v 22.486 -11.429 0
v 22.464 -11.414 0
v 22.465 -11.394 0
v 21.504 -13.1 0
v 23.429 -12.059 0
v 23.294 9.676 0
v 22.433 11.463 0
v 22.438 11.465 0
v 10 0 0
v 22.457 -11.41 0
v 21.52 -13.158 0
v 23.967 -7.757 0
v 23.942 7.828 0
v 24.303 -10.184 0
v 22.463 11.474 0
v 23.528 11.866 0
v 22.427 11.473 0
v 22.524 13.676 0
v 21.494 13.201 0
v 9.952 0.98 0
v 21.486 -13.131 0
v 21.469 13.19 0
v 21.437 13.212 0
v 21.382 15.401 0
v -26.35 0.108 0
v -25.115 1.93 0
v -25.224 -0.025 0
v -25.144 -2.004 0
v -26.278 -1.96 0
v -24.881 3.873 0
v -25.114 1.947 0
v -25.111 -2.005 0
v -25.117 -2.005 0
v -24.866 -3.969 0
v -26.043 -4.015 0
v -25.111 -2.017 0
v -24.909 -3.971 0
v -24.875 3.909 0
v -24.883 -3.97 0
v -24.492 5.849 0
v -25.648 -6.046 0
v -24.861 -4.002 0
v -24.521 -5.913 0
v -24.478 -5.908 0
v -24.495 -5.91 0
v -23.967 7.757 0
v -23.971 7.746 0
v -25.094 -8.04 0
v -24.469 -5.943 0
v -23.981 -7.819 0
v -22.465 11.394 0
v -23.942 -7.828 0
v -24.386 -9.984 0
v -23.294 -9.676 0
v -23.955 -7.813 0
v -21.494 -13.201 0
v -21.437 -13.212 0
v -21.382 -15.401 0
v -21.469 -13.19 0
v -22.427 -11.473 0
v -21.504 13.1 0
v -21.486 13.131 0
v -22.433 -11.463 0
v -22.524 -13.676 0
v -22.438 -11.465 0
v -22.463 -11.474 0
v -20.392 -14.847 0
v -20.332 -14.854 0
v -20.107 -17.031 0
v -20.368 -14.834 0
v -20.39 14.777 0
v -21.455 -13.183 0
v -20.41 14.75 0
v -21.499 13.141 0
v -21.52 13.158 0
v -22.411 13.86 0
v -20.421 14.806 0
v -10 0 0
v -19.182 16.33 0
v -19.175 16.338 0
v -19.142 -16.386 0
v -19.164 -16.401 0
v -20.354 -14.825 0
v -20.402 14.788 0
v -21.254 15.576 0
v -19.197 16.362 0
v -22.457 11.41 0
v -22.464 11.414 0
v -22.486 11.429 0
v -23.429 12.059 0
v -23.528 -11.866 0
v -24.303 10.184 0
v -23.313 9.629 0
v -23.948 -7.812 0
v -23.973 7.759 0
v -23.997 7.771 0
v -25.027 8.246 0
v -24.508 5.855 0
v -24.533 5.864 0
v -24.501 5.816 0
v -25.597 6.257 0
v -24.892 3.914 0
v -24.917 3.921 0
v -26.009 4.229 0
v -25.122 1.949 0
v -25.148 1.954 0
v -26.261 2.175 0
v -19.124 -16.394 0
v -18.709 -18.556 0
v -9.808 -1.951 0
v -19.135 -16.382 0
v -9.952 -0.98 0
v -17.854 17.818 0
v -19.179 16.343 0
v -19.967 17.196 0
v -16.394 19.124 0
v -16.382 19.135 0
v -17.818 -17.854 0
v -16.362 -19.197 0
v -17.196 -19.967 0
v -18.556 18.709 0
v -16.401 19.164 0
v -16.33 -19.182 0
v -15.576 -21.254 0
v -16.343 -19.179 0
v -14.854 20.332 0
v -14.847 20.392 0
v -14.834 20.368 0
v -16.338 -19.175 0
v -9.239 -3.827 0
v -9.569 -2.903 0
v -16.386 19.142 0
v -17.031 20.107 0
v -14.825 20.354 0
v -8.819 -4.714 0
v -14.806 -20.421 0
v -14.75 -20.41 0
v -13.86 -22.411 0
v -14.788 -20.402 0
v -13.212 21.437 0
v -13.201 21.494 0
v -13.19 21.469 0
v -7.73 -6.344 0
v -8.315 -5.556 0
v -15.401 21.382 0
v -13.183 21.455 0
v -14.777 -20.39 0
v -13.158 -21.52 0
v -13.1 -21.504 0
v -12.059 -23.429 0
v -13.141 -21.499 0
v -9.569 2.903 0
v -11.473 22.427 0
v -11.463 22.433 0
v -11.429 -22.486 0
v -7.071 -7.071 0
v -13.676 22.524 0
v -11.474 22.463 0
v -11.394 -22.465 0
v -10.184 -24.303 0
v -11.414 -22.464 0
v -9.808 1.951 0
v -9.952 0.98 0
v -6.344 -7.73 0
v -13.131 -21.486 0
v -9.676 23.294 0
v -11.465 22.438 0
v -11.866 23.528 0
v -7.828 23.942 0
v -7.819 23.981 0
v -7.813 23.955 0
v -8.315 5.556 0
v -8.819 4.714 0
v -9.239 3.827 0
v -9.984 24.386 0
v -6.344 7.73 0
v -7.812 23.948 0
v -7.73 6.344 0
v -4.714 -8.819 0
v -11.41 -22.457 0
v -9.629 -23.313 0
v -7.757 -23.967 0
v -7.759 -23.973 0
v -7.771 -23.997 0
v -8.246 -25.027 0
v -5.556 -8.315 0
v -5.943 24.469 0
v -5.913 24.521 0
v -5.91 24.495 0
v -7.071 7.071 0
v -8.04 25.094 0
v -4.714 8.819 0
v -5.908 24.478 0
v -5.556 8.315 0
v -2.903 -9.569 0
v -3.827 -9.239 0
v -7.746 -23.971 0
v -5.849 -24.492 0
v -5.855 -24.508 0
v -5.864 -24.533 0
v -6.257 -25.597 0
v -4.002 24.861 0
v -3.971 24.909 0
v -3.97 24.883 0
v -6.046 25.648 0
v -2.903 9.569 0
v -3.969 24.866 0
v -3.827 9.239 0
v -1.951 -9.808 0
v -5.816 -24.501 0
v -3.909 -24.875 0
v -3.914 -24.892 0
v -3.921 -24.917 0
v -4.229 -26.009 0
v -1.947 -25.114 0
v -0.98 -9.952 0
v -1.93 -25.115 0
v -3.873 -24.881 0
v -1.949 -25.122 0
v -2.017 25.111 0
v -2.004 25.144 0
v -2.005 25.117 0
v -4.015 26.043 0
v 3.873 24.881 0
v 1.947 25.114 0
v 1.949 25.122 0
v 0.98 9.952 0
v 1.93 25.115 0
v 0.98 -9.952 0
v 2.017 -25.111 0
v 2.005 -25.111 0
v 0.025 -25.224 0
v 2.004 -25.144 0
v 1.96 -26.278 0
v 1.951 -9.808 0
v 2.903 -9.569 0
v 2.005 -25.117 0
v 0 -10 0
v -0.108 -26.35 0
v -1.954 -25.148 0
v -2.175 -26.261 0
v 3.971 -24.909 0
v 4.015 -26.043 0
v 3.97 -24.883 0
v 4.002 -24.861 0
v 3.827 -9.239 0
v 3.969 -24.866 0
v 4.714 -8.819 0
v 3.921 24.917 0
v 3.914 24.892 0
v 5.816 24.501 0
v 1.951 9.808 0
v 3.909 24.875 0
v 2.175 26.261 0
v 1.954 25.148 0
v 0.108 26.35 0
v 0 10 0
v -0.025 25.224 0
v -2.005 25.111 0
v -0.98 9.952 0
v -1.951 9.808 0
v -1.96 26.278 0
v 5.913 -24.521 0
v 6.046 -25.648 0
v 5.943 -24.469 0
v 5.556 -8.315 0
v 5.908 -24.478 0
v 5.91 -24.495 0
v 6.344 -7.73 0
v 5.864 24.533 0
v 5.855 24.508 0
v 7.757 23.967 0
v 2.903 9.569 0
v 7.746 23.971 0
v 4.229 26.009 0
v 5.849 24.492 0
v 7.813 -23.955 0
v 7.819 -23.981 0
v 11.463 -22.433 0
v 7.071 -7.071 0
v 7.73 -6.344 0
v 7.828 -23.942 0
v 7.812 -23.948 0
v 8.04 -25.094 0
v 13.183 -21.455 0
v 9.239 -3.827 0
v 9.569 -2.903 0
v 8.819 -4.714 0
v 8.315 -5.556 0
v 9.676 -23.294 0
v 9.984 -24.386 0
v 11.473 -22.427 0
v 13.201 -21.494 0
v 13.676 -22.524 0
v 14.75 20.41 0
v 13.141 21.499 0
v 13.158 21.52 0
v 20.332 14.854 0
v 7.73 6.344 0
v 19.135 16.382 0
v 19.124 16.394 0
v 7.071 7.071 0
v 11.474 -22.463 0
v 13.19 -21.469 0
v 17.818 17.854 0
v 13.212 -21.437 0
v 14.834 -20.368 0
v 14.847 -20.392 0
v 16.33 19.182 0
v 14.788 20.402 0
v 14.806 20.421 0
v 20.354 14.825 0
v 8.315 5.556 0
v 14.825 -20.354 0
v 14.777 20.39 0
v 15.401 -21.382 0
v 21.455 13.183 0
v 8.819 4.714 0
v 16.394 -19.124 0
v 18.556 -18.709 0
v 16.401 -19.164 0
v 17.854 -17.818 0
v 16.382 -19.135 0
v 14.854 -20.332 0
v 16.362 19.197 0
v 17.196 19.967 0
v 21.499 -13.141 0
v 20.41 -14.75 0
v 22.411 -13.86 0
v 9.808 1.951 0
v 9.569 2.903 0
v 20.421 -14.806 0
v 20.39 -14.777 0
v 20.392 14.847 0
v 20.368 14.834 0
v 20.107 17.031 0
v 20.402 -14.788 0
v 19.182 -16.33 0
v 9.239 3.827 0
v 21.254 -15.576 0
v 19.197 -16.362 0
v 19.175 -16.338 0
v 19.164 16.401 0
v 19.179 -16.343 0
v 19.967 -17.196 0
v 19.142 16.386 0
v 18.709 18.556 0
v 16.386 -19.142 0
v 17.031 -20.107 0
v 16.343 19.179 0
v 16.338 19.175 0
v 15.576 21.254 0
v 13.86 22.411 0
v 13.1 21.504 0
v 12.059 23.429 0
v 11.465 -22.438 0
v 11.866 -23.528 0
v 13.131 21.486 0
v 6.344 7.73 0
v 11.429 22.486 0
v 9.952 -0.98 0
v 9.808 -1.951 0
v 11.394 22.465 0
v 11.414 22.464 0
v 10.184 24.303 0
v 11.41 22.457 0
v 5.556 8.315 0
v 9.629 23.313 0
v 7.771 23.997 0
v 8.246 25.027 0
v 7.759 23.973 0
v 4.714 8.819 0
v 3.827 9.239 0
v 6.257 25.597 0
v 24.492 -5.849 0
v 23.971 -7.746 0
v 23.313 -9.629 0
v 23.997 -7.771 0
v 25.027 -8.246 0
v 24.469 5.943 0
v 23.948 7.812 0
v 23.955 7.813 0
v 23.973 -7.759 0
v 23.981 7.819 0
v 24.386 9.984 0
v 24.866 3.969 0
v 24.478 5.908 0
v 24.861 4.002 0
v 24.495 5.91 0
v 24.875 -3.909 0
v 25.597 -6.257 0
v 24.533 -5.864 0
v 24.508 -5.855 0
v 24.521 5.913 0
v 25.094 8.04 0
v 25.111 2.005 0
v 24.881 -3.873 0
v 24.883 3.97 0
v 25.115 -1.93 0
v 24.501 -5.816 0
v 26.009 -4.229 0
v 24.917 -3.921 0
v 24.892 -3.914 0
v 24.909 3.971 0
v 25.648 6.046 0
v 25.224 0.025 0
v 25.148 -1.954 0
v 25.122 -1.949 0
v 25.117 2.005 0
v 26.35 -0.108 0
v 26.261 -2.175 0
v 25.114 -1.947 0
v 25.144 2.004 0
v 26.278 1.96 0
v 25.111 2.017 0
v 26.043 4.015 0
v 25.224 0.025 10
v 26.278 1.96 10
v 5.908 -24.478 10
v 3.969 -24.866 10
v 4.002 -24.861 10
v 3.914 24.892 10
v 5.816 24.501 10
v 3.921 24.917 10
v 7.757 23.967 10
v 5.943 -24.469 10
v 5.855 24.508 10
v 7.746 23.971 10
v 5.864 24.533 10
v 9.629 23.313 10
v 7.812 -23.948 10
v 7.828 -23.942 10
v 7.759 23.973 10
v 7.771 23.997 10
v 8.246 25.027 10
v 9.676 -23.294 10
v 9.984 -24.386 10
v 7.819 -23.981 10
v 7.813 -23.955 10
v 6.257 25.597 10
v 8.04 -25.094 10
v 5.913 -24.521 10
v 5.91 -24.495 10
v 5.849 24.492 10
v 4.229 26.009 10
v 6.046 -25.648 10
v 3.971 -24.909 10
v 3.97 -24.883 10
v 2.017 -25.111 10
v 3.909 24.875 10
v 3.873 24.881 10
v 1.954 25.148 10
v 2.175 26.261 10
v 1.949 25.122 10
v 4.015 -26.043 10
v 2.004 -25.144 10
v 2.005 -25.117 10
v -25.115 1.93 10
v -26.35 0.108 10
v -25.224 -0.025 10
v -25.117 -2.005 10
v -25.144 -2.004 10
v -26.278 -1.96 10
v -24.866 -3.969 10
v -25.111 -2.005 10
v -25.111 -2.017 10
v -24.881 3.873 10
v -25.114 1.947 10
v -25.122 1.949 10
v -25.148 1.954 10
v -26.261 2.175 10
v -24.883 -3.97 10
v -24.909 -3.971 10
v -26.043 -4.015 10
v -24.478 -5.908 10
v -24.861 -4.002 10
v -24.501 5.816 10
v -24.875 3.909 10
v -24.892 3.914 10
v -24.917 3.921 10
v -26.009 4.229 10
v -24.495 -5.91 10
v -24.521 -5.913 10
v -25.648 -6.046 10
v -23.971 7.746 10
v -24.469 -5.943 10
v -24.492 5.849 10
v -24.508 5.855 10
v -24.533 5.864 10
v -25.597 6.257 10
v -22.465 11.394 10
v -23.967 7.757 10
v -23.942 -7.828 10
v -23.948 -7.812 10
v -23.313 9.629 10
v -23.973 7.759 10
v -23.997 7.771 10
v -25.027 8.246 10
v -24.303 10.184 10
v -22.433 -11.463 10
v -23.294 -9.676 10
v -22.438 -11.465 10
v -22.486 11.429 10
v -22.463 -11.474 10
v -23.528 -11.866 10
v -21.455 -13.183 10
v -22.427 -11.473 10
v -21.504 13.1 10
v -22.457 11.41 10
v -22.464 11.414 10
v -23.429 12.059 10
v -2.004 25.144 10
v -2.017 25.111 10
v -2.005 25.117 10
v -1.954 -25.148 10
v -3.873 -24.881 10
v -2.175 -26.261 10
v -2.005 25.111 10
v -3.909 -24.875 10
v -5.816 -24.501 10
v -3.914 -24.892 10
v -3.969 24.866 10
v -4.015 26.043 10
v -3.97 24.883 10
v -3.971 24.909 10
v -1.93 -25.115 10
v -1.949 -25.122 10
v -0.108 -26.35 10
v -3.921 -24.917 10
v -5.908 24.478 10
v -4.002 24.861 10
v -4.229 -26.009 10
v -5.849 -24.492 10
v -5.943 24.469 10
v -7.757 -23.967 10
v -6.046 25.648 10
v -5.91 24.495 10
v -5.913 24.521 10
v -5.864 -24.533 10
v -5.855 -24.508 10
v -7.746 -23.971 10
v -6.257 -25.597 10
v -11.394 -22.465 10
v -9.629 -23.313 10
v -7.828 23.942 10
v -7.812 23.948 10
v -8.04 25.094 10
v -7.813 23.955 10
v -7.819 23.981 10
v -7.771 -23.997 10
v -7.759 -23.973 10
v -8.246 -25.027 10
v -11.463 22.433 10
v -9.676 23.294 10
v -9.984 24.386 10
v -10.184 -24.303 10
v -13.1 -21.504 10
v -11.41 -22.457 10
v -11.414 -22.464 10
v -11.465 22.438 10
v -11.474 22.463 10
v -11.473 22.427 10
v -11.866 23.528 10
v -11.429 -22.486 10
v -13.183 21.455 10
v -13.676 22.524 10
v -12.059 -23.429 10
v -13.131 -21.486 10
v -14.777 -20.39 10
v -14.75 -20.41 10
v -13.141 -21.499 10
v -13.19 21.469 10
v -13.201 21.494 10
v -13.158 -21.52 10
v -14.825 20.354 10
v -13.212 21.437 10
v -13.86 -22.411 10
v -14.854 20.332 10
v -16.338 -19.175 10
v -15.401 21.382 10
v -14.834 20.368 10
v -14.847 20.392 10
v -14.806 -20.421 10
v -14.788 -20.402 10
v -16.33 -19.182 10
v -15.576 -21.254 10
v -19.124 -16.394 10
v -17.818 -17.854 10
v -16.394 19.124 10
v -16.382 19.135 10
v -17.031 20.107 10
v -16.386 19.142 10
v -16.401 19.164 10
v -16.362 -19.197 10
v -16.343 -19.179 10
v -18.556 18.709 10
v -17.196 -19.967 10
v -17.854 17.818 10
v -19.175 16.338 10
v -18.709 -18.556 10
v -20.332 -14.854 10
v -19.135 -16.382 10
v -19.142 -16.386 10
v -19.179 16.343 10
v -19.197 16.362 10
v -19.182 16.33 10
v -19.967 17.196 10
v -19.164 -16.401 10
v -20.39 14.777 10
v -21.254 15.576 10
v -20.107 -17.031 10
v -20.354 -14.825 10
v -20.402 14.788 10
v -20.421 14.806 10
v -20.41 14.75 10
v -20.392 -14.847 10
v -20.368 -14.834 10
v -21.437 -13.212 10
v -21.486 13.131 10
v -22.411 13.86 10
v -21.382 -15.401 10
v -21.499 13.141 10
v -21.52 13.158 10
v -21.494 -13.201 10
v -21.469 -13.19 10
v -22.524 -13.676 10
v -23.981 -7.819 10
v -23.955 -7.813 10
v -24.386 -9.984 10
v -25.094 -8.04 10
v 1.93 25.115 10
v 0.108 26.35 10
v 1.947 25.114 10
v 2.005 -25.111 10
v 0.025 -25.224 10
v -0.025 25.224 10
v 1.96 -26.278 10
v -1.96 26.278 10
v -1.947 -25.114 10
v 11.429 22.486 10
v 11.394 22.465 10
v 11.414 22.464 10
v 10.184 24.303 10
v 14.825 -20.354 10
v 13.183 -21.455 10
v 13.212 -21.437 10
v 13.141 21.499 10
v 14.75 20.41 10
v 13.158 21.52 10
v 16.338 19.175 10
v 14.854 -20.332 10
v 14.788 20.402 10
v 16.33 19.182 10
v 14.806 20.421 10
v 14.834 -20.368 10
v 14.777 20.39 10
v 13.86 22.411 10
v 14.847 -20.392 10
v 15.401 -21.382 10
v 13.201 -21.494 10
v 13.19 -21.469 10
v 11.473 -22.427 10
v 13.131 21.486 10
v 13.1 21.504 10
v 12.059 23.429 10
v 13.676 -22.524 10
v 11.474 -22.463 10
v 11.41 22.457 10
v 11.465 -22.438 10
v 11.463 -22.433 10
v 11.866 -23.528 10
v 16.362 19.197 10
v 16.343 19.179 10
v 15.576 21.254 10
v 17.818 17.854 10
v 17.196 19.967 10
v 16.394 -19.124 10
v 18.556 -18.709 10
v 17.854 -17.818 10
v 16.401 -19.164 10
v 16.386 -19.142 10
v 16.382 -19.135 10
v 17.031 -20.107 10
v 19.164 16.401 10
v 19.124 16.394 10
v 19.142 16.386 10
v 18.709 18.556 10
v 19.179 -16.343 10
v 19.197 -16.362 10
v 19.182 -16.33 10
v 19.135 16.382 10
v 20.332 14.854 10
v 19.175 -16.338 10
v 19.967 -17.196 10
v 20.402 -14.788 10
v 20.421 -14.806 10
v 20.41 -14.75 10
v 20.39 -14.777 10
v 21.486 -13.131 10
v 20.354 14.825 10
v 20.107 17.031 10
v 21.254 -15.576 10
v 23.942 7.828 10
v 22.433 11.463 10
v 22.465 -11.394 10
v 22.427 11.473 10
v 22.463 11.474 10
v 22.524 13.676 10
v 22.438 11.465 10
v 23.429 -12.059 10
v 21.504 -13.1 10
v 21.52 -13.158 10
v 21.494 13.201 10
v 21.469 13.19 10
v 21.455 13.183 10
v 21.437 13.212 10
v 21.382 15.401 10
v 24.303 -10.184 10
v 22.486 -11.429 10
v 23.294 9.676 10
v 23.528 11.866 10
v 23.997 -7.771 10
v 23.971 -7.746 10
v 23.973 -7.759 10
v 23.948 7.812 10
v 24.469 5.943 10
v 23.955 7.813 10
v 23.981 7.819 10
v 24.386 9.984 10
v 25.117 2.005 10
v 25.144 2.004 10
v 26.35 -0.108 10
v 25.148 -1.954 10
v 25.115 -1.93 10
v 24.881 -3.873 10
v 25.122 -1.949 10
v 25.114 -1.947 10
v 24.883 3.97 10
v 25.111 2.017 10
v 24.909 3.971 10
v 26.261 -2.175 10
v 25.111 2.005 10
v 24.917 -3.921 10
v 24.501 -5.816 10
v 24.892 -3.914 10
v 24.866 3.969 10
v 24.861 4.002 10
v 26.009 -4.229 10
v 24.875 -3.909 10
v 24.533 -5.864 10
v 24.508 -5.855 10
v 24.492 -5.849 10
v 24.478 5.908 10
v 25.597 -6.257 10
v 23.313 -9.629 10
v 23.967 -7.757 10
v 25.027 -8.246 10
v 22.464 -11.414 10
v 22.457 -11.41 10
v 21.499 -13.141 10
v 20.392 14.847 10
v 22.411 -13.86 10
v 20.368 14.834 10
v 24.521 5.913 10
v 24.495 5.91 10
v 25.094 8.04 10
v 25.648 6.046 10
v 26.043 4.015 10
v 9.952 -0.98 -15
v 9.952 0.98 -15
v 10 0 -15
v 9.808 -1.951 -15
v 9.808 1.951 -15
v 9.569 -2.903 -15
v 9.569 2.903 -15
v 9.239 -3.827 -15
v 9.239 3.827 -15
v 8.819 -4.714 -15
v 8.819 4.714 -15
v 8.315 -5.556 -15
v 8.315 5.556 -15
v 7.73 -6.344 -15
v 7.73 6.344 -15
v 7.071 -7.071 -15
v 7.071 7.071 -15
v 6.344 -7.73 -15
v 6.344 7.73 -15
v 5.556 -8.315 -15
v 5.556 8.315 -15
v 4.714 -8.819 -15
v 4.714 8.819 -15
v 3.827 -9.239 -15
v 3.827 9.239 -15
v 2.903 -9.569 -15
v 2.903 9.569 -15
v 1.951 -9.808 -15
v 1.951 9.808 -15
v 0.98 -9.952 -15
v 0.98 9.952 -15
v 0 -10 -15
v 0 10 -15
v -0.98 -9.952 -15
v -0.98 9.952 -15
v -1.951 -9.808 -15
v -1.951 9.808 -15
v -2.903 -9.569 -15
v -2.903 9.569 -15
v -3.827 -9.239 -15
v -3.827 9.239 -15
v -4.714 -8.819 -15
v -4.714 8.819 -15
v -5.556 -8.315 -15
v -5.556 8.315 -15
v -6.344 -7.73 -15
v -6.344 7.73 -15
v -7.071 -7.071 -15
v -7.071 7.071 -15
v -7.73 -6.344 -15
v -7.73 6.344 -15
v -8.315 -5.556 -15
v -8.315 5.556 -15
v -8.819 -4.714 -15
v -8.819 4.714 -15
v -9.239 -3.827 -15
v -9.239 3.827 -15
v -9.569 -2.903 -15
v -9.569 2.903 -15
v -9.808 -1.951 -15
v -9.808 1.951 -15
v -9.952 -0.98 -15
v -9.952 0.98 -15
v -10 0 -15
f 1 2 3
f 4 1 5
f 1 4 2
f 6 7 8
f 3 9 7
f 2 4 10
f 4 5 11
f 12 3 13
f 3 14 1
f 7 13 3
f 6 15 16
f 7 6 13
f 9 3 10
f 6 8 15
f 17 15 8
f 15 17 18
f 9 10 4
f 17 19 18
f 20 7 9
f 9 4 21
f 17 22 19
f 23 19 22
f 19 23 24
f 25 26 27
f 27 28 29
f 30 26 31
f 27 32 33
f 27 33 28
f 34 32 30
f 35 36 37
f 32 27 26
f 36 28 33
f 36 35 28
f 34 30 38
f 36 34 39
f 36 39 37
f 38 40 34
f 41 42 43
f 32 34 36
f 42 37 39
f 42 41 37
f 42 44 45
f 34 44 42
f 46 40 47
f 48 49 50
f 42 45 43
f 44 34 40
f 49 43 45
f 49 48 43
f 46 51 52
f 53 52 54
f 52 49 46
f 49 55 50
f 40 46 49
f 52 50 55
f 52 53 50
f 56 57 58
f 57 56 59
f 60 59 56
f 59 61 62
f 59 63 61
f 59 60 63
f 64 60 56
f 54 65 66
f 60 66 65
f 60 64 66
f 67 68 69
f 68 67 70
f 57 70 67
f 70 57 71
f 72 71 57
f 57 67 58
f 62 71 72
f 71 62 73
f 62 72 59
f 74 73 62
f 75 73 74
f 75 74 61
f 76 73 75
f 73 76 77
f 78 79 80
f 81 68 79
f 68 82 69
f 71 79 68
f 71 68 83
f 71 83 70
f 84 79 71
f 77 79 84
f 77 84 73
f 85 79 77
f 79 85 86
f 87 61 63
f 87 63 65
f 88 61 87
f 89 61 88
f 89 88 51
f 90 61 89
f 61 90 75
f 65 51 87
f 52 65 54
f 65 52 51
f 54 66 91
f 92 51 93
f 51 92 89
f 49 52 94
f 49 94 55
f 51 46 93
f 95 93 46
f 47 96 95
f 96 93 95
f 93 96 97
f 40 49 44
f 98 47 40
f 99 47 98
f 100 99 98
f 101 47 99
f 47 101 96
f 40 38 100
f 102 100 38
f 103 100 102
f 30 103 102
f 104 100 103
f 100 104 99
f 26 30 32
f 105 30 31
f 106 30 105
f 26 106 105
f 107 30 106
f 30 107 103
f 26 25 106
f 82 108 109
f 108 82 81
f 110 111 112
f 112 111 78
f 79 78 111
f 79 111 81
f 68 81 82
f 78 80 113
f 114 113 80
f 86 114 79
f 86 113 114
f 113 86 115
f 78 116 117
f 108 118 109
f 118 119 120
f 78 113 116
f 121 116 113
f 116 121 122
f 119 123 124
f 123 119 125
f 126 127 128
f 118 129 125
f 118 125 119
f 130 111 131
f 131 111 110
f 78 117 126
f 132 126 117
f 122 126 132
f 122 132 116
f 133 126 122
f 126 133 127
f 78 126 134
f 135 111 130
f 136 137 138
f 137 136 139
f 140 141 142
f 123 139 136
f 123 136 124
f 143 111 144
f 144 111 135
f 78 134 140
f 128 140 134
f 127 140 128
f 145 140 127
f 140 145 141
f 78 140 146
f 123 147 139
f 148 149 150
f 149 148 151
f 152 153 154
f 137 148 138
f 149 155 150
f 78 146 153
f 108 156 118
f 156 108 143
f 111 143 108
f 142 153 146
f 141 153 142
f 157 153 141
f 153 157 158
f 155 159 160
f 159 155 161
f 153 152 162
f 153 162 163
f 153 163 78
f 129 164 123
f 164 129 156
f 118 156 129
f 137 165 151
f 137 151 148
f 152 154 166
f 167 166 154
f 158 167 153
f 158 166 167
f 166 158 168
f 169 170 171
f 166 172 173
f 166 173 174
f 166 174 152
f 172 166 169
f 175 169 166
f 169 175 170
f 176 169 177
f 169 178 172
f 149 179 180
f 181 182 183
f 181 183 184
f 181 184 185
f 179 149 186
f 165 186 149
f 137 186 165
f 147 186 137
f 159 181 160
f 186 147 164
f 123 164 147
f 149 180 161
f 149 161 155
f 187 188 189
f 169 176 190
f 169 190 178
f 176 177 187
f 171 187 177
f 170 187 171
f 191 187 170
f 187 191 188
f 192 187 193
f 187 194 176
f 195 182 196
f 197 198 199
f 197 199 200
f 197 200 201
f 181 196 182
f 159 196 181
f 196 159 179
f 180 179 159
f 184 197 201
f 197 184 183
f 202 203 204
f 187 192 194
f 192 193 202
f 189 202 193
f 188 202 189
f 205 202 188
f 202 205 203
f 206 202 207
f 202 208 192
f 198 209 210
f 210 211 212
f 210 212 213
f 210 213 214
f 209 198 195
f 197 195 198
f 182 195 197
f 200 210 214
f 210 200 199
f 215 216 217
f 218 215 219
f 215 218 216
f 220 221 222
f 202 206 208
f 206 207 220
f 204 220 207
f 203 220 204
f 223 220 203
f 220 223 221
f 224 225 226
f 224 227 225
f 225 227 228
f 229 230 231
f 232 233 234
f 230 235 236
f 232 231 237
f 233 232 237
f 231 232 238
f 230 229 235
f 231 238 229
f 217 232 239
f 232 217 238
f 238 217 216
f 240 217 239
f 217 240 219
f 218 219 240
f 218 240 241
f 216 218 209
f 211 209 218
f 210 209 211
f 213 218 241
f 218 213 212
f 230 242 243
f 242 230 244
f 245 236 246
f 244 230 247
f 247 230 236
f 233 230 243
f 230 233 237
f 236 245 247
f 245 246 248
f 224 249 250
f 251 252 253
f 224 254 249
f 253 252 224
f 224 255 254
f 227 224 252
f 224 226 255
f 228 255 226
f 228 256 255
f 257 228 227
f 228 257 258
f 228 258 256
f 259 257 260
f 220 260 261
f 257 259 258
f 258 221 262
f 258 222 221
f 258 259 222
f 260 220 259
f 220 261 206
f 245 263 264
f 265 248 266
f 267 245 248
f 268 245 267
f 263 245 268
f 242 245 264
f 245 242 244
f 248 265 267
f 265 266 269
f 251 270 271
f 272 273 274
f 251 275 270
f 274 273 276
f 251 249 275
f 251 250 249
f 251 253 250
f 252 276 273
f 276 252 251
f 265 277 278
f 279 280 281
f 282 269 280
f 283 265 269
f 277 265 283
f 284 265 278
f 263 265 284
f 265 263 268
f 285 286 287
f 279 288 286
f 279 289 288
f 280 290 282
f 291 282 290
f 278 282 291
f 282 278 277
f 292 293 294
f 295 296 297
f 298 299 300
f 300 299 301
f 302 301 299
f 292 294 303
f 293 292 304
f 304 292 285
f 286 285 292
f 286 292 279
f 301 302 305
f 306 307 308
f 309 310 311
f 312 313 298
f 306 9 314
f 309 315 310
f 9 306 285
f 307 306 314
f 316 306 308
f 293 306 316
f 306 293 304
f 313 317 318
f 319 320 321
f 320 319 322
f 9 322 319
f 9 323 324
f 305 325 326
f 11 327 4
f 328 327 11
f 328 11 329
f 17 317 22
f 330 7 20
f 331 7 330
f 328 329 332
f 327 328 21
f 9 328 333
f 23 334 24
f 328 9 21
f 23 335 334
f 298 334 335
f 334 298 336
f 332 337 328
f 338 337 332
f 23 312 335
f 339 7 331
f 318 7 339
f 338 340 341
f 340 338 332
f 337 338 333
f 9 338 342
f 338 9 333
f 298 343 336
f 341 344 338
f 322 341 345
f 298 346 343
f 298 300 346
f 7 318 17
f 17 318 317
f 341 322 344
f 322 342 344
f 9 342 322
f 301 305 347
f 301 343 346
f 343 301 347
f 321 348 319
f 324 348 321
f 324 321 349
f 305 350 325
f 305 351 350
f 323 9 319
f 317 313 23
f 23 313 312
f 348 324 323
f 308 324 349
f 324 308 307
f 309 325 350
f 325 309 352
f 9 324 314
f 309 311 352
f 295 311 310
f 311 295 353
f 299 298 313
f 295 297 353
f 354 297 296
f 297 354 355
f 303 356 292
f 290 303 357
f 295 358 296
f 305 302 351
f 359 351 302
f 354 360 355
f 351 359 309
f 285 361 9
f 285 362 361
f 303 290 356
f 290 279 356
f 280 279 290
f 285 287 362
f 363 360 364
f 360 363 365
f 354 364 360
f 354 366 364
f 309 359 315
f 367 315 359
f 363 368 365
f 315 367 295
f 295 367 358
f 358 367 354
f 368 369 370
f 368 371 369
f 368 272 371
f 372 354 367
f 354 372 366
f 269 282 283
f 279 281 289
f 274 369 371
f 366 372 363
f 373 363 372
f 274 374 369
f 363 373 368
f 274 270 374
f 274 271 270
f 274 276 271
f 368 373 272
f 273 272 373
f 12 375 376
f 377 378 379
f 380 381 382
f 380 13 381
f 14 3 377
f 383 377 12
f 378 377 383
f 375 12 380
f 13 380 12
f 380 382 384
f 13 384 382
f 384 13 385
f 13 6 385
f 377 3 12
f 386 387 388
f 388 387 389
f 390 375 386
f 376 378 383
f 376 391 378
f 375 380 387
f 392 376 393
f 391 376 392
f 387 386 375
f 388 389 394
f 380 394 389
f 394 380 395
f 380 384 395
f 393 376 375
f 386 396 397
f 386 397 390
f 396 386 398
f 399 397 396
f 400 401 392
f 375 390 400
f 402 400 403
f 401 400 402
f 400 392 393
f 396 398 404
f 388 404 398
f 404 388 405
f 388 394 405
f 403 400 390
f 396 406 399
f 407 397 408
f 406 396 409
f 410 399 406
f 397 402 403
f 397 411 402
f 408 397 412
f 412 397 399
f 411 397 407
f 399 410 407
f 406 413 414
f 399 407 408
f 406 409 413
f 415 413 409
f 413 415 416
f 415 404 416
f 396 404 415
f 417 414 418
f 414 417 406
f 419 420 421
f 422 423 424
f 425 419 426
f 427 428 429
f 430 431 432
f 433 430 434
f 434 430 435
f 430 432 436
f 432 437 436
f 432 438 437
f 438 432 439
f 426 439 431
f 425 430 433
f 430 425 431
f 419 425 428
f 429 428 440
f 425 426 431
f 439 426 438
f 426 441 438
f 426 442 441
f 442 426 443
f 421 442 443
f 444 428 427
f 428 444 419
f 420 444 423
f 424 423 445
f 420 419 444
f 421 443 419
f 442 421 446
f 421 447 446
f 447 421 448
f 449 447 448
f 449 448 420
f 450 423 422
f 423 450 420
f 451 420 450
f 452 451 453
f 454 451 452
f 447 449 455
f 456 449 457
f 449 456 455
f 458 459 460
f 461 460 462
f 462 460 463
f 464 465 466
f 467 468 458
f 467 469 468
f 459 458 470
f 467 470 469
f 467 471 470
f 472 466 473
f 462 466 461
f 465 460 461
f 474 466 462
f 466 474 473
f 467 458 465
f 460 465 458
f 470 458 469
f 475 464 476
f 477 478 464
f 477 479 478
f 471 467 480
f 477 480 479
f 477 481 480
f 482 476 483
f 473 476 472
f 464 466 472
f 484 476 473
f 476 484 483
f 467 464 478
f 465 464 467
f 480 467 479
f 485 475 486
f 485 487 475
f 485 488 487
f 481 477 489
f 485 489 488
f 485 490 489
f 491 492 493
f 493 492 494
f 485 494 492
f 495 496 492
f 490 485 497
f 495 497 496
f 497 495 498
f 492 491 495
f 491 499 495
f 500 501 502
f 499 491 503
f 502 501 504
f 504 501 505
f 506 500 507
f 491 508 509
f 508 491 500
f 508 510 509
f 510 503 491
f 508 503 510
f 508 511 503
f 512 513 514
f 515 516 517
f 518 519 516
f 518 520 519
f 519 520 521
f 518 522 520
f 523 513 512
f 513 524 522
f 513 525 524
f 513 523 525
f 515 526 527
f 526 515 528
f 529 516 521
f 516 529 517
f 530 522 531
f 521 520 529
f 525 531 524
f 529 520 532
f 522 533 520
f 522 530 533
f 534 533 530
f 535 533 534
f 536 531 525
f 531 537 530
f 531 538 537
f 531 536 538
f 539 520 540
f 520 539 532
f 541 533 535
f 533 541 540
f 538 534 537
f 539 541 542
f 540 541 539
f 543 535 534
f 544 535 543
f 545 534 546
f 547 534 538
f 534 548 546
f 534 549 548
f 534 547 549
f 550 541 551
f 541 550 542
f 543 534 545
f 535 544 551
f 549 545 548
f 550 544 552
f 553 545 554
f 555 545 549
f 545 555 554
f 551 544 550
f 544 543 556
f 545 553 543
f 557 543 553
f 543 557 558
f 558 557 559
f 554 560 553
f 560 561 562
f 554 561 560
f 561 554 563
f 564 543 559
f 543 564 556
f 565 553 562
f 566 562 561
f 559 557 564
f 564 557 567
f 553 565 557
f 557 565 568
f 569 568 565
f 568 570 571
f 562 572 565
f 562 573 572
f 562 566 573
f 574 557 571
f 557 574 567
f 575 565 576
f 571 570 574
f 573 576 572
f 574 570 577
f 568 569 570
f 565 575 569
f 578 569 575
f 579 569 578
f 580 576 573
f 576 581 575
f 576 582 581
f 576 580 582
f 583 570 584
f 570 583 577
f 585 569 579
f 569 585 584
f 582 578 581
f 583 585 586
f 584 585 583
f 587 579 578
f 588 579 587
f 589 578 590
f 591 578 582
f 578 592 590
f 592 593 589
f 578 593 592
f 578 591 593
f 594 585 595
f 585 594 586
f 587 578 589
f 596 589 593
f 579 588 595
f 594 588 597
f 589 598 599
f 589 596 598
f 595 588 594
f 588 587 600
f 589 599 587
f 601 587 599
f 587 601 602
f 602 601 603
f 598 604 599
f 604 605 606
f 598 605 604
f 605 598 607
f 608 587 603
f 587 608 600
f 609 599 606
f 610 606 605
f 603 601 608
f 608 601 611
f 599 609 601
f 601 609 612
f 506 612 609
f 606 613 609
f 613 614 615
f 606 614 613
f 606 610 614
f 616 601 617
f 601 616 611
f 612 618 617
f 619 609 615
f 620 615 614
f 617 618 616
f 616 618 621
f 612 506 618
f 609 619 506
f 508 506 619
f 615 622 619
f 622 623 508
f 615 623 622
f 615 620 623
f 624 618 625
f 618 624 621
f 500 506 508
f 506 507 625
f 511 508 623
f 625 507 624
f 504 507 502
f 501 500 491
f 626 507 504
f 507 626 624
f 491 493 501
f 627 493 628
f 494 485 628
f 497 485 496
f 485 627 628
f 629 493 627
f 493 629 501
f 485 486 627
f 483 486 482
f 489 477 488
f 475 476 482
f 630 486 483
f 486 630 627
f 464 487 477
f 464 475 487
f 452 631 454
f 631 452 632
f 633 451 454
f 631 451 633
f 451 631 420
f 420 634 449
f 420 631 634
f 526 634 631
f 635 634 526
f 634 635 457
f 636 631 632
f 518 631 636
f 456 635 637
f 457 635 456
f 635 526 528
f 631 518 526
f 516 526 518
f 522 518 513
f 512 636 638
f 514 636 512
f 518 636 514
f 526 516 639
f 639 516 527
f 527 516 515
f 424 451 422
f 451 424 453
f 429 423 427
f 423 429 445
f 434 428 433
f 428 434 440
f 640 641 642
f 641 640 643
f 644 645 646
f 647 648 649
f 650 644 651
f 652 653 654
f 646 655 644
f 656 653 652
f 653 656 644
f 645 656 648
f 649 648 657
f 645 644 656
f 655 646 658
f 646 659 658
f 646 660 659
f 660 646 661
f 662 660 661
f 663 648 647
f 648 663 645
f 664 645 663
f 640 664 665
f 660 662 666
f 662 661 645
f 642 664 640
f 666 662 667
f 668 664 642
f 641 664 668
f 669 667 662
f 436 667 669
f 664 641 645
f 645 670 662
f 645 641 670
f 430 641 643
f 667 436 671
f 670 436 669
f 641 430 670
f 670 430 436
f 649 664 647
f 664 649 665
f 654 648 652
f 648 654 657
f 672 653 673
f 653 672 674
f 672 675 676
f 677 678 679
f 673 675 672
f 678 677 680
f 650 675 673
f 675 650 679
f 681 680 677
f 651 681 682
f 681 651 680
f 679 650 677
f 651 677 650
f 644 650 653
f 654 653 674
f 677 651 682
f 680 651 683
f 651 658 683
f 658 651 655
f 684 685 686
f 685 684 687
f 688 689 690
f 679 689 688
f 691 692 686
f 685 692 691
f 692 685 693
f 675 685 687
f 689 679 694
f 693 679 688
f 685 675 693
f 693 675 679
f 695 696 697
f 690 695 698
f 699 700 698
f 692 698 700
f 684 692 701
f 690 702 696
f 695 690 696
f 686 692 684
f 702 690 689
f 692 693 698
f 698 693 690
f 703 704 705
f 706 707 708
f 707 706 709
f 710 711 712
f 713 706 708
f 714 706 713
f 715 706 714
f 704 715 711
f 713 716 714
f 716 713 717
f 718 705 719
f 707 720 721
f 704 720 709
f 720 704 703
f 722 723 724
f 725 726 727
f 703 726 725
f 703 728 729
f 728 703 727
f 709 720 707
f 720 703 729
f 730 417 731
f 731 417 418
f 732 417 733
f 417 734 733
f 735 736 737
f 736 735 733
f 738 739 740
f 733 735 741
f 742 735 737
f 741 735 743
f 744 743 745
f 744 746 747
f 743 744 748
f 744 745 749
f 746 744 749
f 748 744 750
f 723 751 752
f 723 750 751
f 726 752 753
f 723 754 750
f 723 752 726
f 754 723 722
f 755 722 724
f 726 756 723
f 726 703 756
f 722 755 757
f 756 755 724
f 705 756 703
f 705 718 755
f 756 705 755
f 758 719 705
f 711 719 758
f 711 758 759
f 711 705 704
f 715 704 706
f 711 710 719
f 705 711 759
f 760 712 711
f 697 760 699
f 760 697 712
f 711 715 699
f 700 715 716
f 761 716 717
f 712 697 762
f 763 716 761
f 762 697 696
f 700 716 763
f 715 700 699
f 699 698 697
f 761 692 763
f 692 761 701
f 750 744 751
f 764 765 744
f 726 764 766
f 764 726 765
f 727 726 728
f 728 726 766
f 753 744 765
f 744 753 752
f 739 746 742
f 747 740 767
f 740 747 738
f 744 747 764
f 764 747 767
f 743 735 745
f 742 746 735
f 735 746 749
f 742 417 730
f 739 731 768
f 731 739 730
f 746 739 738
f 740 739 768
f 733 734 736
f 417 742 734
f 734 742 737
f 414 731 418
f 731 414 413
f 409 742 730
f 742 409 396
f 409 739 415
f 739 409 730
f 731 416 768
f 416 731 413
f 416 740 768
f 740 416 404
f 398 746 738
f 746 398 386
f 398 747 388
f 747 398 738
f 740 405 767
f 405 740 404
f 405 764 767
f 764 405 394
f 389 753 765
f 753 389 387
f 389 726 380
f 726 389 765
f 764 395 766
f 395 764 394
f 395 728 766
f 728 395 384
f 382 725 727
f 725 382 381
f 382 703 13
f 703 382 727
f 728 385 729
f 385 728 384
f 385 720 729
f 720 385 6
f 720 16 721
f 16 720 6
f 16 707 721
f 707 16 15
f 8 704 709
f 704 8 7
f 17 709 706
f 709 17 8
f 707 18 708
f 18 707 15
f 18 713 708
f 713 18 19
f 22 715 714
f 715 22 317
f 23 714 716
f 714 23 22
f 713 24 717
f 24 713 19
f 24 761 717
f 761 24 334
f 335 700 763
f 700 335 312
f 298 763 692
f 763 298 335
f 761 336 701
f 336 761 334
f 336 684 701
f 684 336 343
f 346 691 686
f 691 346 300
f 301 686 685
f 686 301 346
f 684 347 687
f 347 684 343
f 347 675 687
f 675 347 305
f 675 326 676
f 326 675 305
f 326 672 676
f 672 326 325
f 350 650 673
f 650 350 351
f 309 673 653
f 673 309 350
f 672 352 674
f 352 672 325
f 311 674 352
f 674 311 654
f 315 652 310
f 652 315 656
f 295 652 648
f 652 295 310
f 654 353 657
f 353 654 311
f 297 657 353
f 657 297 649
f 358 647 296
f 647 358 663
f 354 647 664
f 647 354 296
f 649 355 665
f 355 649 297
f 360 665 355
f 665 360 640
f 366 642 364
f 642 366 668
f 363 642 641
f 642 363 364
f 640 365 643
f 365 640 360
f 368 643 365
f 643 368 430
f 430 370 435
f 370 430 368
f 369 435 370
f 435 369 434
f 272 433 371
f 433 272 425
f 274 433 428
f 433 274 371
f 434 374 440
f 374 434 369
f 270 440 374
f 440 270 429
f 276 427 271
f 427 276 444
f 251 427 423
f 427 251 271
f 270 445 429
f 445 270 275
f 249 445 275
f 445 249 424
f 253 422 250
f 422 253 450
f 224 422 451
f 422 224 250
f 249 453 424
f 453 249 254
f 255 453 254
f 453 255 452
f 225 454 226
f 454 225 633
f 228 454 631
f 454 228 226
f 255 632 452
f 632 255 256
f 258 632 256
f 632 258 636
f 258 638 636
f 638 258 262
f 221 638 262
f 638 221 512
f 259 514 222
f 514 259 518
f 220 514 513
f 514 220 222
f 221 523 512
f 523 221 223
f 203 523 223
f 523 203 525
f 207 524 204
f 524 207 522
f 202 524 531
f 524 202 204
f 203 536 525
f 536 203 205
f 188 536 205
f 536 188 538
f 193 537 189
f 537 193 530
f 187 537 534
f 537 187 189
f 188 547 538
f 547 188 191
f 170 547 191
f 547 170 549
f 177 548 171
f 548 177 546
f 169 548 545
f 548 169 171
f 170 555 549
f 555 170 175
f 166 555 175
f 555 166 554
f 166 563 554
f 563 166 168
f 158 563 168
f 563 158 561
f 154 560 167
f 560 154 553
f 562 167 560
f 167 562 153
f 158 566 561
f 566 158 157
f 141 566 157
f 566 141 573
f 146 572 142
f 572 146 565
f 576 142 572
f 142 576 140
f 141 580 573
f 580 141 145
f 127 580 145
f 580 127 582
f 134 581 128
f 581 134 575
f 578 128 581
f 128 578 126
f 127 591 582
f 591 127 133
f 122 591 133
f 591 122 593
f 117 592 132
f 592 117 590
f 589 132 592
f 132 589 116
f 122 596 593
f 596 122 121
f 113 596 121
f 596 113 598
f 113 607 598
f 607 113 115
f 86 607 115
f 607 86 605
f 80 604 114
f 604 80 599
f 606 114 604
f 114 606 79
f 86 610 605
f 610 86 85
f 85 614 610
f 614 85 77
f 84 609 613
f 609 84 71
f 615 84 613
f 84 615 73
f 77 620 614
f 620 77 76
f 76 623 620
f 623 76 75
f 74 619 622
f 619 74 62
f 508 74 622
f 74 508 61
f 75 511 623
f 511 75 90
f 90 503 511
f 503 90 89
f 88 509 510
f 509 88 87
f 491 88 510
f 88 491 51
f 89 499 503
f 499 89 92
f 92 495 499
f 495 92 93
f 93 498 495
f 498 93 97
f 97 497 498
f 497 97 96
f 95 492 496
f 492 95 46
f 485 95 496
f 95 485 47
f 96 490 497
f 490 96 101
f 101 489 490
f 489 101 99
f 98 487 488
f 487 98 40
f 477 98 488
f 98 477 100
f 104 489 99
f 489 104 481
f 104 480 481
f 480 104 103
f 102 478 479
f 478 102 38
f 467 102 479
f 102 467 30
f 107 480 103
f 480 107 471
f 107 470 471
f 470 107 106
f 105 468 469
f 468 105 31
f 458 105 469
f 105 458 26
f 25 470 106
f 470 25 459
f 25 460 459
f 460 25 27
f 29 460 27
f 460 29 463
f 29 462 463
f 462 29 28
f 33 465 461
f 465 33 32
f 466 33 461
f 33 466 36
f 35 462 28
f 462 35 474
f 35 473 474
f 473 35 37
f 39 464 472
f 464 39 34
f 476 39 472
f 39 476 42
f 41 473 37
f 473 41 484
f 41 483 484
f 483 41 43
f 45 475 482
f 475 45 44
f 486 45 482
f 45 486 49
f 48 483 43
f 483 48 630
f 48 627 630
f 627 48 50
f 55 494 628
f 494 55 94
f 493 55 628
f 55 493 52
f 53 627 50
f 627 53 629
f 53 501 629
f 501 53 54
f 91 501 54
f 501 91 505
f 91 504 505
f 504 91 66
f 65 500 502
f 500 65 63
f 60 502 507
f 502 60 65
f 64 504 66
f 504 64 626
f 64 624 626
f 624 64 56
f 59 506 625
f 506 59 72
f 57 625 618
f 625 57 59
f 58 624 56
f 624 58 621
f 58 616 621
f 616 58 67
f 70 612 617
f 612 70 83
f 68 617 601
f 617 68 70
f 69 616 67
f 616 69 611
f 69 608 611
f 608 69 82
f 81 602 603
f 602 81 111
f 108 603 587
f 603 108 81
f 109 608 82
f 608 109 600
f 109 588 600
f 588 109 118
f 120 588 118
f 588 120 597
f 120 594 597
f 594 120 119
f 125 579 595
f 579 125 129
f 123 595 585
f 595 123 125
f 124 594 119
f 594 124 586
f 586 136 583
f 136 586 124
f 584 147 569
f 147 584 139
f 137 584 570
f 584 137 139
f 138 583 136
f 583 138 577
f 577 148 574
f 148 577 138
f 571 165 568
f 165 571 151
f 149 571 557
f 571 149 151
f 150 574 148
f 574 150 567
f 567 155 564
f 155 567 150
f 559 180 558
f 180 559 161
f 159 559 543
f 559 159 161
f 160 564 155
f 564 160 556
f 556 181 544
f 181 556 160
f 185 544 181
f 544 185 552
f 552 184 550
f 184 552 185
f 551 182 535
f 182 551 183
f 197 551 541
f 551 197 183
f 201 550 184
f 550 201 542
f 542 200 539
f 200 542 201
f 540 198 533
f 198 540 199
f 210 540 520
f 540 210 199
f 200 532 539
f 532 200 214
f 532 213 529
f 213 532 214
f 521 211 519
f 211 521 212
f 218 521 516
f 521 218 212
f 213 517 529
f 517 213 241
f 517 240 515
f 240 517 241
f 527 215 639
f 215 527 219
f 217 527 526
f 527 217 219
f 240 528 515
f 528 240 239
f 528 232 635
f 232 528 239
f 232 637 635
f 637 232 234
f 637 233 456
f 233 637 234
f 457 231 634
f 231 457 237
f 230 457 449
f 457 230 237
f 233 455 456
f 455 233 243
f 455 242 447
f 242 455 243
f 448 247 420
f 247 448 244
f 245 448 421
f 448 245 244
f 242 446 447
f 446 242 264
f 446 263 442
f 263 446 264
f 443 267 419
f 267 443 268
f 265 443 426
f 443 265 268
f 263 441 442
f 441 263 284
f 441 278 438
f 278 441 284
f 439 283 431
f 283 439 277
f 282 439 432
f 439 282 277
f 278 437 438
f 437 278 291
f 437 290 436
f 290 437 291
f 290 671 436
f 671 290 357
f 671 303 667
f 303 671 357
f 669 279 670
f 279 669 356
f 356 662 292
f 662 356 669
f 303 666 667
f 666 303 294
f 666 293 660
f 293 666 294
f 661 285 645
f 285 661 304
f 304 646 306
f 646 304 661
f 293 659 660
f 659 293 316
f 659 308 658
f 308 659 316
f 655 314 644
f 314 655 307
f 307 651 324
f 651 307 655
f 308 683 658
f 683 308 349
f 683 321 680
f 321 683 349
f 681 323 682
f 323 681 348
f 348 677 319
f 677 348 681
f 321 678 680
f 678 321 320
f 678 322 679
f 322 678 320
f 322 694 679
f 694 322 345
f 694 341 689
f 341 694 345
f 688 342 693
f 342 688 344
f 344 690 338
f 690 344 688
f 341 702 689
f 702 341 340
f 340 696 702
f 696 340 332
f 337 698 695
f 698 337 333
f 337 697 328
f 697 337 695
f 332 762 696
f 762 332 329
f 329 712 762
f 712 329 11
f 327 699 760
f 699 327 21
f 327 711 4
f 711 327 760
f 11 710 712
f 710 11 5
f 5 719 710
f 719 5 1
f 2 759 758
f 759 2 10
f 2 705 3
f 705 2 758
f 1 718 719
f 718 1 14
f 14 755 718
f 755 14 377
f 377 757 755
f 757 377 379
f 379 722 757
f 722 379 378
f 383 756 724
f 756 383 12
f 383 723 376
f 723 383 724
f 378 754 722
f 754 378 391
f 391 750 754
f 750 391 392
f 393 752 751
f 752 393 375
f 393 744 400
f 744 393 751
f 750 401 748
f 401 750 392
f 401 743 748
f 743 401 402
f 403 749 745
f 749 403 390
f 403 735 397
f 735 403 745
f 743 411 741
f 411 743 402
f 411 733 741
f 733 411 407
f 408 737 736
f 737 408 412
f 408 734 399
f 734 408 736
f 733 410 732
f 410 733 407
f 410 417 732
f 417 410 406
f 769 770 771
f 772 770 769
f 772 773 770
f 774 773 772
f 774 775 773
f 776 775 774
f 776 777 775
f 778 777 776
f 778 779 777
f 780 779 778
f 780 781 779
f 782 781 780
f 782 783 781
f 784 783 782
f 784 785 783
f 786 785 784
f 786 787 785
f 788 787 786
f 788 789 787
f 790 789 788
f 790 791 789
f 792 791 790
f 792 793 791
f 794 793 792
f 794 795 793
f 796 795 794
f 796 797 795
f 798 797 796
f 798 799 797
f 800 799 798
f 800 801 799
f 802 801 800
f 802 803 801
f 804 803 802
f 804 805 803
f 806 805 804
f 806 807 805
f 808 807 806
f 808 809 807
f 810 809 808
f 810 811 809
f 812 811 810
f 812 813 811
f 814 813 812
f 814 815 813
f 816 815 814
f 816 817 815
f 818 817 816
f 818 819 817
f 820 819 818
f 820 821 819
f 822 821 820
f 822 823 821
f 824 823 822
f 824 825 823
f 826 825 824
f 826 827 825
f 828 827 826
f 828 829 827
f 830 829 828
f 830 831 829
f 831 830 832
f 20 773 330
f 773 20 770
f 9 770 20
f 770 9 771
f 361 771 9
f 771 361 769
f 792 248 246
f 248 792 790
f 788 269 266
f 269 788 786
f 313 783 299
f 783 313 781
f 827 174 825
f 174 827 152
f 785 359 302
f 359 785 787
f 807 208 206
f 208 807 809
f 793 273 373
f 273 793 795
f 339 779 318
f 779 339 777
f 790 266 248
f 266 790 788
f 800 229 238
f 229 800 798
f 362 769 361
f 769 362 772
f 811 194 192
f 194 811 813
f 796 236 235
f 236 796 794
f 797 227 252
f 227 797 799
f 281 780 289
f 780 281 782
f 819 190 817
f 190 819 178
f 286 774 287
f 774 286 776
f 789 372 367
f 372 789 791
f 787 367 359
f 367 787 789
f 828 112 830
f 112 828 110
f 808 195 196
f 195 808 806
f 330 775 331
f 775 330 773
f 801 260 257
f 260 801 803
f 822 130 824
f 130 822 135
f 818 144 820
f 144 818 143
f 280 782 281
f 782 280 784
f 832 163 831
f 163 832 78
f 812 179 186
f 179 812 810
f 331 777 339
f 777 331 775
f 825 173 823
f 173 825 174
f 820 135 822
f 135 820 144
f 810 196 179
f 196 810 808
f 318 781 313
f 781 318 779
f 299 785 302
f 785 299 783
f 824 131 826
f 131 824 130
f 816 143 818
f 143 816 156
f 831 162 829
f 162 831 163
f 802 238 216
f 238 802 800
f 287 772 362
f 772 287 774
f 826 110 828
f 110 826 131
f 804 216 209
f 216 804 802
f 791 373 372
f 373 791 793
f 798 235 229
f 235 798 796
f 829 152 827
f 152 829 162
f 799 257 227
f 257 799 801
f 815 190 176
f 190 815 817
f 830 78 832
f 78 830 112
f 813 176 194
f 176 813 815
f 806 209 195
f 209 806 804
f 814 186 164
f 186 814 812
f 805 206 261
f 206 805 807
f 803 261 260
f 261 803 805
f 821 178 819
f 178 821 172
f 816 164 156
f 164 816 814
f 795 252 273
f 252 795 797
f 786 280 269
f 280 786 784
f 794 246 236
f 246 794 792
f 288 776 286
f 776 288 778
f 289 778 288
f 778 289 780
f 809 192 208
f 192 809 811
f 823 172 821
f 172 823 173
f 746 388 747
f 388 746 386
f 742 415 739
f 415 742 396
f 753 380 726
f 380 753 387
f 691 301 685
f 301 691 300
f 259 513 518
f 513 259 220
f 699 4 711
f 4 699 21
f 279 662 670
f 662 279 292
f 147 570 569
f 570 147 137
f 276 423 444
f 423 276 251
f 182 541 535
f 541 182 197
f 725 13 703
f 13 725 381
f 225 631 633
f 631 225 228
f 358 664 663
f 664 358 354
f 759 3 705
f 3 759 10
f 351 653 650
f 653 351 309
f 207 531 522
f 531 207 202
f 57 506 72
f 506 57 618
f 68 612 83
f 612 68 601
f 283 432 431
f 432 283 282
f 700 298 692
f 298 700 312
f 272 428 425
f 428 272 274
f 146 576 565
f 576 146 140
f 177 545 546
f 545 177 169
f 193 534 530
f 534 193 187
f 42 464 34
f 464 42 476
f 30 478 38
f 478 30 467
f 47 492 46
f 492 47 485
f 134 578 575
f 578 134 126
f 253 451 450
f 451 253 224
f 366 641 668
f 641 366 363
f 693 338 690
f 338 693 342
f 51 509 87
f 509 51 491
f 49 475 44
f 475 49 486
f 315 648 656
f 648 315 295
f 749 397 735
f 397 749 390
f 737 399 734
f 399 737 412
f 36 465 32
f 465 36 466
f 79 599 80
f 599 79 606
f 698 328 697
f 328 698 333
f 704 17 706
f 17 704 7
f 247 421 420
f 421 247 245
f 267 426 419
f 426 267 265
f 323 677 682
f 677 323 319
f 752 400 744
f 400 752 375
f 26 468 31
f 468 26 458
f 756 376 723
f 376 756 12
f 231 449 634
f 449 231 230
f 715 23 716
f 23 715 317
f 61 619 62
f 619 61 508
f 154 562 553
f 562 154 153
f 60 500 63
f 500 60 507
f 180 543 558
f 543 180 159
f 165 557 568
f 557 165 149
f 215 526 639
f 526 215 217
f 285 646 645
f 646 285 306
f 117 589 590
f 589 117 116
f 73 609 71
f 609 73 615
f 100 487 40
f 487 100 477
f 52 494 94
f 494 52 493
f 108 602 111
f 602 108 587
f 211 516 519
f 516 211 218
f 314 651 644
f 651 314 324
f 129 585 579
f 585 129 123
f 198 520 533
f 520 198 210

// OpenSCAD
module timing_pulley(teeth=80, pitch_diameter=50.42, belt_width=10, tooth_height=2, hub_diameter=20, hub_height=15) {
    tooth_angle = 360 / teeth;
    tooth_width = pitch_diameter * PI / teeth;
    
    module tooth() {
        translate([pitch_diameter / 2, 0, 0])
        rotate([0, 0, -tooth_angle / 2])
        linear_extrude(height=belt_width)
        polygon(points=[[0, 0], [tooth_width / 2, tooth_height], [-tooth_width / 2, tooth_height]]);
    }
    
    module pulley_teeth() {
        for (i = [0:teeth-1]) {
            rotate([0, 0, i * tooth_angle])
            tooth();
        }
    }
    
    module hub() {
        cylinder(d=hub_diameter, h=hub_height, $fn=64);
    }
    
    module belt_surface() {
        cylinder(d=pitch_diameter, h=belt_width, $fn=64);
    }
    
    union() {
        pulley_teeth();
        translate([0, 0, -hub_height])
        hub();
        belt_surface();
    }
}

timing_pulley();
